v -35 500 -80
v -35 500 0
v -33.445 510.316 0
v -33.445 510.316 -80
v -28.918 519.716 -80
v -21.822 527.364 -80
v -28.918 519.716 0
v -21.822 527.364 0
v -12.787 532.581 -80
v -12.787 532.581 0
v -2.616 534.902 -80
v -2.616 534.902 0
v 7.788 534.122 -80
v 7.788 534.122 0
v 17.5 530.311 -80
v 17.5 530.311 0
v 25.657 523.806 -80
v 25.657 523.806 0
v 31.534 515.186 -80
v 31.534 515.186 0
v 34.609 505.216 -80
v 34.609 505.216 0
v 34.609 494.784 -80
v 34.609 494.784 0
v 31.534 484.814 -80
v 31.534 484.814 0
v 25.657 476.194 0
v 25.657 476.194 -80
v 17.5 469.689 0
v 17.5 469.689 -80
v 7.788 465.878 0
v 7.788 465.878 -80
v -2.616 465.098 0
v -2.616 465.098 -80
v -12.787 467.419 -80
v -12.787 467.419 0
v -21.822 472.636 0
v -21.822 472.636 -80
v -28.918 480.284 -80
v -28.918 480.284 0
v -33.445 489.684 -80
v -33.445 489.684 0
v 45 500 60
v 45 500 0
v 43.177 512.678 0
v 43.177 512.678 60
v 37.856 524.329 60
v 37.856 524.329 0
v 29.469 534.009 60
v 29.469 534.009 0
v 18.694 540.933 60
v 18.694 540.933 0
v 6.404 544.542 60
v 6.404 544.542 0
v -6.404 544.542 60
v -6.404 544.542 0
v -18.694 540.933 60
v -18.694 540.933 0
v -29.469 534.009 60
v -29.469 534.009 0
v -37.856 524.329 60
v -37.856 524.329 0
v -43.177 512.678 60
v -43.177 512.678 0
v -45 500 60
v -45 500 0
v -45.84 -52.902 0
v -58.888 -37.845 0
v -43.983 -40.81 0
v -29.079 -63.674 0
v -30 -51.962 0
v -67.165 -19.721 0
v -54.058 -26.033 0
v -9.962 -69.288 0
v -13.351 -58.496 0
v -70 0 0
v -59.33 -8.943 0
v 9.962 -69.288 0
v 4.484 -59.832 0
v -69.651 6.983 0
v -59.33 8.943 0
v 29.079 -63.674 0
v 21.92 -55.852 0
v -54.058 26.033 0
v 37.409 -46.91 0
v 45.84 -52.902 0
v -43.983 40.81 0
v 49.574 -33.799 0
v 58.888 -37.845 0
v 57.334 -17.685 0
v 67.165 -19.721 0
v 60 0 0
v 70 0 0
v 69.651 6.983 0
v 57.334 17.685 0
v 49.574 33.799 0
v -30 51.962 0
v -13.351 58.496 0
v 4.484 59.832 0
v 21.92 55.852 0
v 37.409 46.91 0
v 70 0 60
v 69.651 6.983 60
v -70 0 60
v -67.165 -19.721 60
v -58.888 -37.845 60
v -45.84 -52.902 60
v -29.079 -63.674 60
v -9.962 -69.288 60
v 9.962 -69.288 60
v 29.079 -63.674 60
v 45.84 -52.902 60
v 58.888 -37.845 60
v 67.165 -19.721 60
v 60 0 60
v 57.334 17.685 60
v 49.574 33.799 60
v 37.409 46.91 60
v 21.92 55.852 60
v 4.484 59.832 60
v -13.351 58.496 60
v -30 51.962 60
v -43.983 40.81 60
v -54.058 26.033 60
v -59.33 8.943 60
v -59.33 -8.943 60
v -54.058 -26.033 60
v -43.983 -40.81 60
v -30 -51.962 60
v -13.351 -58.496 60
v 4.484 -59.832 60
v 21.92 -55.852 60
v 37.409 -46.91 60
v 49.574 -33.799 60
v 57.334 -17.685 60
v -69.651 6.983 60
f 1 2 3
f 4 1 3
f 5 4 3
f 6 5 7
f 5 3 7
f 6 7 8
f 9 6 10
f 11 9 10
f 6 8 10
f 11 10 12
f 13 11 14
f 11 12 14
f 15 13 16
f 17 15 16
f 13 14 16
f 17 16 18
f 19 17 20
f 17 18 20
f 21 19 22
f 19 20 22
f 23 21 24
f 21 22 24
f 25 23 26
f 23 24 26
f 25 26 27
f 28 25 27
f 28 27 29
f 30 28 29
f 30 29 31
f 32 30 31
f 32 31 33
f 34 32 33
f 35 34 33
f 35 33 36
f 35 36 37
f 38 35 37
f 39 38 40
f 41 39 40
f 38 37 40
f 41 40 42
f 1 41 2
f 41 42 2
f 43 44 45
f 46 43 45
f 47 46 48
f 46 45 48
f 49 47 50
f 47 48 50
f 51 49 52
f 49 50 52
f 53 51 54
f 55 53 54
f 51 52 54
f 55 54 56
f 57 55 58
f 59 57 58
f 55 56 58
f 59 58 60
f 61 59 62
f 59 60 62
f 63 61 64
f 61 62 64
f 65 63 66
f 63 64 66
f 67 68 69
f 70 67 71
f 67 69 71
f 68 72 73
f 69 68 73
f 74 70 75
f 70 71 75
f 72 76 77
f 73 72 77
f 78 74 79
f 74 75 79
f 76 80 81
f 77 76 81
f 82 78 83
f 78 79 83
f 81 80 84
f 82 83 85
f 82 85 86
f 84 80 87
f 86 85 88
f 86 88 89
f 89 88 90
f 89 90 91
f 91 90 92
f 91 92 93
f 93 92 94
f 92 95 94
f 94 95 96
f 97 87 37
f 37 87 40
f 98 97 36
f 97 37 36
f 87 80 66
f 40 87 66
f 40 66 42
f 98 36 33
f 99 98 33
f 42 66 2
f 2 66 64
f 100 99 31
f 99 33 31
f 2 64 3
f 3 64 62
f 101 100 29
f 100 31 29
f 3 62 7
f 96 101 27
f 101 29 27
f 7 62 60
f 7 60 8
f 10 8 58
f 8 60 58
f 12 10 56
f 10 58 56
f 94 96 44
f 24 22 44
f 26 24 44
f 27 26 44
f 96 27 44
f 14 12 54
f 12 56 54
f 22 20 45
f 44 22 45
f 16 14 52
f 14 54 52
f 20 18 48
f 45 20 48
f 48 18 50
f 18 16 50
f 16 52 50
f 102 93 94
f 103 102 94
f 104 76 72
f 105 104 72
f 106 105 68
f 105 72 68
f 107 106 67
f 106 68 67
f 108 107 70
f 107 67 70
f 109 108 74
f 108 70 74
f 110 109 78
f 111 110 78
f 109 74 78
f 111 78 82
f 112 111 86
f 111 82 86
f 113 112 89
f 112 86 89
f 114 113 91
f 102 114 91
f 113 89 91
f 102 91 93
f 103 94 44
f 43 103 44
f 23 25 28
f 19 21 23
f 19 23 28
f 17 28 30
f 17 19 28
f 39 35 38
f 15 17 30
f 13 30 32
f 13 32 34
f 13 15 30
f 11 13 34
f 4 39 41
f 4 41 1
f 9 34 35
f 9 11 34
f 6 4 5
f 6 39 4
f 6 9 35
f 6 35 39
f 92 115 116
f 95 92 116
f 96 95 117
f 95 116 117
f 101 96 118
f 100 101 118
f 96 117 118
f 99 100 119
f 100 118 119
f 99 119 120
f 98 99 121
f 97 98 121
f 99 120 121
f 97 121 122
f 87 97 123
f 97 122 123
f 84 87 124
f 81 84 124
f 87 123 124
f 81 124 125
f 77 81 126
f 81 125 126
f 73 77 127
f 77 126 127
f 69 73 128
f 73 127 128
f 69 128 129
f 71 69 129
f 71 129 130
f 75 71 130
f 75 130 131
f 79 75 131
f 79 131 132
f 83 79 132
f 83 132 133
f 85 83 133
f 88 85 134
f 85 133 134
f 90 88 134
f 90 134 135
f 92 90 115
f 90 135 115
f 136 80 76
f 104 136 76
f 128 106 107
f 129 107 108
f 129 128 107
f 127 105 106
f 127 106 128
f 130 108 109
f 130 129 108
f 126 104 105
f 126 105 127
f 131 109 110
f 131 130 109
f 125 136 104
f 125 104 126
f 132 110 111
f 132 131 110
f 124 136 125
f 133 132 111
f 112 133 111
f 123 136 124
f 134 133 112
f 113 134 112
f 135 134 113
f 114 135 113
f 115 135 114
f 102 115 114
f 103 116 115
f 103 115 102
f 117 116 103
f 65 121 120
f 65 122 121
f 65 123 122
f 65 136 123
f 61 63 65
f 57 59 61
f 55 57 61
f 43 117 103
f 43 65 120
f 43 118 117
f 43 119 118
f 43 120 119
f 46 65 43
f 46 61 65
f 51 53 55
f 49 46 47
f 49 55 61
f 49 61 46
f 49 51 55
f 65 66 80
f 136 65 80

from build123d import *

# Parameters (mm, degrees)
EXTRUDE_1_DEPTH     = 60
SKETCH_2_R          = 60
CUT_EXTRUDE_1_DEPTH = 60
SKETCH_3_R          = 35
EXTRUDE_2_DEPTH     = 80


with BuildPart() as part:
    # Эскиз1 → Бобышка-Вытянуть1 (new body)
    with BuildSketch(Plane.XY):
        with BuildLine():
            Line((-69.650872818, 6.982543641), (-70, 0))
            ThreePointArc((-70, 0), (0, -70), (70, 0))
            Line((70, 0), (69.650872818, 6.982543641))
            Line((69.650872818, 6.982543641), (45, 500))
            ThreePointArc((45, 500), (0, 545), (-45, 500))
            Line((-45, 500), (-69.650872818, 6.982543641))
        make_face()
    extrude(amount=EXTRUDE_1_DEPTH)

    # Эскиз2 → Вырез-Вытянуть1 (cut)
    with BuildSketch(Plane.XY.offset(60)):
        Circle(SKETCH_2_R)
    extrude(amount=-CUT_EXTRUDE_1_DEPTH, mode=Mode.SUBTRACT)

    # Эскиз3 → Бобышка-Вытянуть2 (add)
    with BuildSketch(Plane(origin=(0, 0, 0), x_dir=(-1, 0, 0), z_dir=(0, 0, -1))):
        with Locations((0, 500)):
            Circle(SKETCH_3_R)
    extrude(amount=EXTRUDE_2_DEPTH)


solid = part.part
